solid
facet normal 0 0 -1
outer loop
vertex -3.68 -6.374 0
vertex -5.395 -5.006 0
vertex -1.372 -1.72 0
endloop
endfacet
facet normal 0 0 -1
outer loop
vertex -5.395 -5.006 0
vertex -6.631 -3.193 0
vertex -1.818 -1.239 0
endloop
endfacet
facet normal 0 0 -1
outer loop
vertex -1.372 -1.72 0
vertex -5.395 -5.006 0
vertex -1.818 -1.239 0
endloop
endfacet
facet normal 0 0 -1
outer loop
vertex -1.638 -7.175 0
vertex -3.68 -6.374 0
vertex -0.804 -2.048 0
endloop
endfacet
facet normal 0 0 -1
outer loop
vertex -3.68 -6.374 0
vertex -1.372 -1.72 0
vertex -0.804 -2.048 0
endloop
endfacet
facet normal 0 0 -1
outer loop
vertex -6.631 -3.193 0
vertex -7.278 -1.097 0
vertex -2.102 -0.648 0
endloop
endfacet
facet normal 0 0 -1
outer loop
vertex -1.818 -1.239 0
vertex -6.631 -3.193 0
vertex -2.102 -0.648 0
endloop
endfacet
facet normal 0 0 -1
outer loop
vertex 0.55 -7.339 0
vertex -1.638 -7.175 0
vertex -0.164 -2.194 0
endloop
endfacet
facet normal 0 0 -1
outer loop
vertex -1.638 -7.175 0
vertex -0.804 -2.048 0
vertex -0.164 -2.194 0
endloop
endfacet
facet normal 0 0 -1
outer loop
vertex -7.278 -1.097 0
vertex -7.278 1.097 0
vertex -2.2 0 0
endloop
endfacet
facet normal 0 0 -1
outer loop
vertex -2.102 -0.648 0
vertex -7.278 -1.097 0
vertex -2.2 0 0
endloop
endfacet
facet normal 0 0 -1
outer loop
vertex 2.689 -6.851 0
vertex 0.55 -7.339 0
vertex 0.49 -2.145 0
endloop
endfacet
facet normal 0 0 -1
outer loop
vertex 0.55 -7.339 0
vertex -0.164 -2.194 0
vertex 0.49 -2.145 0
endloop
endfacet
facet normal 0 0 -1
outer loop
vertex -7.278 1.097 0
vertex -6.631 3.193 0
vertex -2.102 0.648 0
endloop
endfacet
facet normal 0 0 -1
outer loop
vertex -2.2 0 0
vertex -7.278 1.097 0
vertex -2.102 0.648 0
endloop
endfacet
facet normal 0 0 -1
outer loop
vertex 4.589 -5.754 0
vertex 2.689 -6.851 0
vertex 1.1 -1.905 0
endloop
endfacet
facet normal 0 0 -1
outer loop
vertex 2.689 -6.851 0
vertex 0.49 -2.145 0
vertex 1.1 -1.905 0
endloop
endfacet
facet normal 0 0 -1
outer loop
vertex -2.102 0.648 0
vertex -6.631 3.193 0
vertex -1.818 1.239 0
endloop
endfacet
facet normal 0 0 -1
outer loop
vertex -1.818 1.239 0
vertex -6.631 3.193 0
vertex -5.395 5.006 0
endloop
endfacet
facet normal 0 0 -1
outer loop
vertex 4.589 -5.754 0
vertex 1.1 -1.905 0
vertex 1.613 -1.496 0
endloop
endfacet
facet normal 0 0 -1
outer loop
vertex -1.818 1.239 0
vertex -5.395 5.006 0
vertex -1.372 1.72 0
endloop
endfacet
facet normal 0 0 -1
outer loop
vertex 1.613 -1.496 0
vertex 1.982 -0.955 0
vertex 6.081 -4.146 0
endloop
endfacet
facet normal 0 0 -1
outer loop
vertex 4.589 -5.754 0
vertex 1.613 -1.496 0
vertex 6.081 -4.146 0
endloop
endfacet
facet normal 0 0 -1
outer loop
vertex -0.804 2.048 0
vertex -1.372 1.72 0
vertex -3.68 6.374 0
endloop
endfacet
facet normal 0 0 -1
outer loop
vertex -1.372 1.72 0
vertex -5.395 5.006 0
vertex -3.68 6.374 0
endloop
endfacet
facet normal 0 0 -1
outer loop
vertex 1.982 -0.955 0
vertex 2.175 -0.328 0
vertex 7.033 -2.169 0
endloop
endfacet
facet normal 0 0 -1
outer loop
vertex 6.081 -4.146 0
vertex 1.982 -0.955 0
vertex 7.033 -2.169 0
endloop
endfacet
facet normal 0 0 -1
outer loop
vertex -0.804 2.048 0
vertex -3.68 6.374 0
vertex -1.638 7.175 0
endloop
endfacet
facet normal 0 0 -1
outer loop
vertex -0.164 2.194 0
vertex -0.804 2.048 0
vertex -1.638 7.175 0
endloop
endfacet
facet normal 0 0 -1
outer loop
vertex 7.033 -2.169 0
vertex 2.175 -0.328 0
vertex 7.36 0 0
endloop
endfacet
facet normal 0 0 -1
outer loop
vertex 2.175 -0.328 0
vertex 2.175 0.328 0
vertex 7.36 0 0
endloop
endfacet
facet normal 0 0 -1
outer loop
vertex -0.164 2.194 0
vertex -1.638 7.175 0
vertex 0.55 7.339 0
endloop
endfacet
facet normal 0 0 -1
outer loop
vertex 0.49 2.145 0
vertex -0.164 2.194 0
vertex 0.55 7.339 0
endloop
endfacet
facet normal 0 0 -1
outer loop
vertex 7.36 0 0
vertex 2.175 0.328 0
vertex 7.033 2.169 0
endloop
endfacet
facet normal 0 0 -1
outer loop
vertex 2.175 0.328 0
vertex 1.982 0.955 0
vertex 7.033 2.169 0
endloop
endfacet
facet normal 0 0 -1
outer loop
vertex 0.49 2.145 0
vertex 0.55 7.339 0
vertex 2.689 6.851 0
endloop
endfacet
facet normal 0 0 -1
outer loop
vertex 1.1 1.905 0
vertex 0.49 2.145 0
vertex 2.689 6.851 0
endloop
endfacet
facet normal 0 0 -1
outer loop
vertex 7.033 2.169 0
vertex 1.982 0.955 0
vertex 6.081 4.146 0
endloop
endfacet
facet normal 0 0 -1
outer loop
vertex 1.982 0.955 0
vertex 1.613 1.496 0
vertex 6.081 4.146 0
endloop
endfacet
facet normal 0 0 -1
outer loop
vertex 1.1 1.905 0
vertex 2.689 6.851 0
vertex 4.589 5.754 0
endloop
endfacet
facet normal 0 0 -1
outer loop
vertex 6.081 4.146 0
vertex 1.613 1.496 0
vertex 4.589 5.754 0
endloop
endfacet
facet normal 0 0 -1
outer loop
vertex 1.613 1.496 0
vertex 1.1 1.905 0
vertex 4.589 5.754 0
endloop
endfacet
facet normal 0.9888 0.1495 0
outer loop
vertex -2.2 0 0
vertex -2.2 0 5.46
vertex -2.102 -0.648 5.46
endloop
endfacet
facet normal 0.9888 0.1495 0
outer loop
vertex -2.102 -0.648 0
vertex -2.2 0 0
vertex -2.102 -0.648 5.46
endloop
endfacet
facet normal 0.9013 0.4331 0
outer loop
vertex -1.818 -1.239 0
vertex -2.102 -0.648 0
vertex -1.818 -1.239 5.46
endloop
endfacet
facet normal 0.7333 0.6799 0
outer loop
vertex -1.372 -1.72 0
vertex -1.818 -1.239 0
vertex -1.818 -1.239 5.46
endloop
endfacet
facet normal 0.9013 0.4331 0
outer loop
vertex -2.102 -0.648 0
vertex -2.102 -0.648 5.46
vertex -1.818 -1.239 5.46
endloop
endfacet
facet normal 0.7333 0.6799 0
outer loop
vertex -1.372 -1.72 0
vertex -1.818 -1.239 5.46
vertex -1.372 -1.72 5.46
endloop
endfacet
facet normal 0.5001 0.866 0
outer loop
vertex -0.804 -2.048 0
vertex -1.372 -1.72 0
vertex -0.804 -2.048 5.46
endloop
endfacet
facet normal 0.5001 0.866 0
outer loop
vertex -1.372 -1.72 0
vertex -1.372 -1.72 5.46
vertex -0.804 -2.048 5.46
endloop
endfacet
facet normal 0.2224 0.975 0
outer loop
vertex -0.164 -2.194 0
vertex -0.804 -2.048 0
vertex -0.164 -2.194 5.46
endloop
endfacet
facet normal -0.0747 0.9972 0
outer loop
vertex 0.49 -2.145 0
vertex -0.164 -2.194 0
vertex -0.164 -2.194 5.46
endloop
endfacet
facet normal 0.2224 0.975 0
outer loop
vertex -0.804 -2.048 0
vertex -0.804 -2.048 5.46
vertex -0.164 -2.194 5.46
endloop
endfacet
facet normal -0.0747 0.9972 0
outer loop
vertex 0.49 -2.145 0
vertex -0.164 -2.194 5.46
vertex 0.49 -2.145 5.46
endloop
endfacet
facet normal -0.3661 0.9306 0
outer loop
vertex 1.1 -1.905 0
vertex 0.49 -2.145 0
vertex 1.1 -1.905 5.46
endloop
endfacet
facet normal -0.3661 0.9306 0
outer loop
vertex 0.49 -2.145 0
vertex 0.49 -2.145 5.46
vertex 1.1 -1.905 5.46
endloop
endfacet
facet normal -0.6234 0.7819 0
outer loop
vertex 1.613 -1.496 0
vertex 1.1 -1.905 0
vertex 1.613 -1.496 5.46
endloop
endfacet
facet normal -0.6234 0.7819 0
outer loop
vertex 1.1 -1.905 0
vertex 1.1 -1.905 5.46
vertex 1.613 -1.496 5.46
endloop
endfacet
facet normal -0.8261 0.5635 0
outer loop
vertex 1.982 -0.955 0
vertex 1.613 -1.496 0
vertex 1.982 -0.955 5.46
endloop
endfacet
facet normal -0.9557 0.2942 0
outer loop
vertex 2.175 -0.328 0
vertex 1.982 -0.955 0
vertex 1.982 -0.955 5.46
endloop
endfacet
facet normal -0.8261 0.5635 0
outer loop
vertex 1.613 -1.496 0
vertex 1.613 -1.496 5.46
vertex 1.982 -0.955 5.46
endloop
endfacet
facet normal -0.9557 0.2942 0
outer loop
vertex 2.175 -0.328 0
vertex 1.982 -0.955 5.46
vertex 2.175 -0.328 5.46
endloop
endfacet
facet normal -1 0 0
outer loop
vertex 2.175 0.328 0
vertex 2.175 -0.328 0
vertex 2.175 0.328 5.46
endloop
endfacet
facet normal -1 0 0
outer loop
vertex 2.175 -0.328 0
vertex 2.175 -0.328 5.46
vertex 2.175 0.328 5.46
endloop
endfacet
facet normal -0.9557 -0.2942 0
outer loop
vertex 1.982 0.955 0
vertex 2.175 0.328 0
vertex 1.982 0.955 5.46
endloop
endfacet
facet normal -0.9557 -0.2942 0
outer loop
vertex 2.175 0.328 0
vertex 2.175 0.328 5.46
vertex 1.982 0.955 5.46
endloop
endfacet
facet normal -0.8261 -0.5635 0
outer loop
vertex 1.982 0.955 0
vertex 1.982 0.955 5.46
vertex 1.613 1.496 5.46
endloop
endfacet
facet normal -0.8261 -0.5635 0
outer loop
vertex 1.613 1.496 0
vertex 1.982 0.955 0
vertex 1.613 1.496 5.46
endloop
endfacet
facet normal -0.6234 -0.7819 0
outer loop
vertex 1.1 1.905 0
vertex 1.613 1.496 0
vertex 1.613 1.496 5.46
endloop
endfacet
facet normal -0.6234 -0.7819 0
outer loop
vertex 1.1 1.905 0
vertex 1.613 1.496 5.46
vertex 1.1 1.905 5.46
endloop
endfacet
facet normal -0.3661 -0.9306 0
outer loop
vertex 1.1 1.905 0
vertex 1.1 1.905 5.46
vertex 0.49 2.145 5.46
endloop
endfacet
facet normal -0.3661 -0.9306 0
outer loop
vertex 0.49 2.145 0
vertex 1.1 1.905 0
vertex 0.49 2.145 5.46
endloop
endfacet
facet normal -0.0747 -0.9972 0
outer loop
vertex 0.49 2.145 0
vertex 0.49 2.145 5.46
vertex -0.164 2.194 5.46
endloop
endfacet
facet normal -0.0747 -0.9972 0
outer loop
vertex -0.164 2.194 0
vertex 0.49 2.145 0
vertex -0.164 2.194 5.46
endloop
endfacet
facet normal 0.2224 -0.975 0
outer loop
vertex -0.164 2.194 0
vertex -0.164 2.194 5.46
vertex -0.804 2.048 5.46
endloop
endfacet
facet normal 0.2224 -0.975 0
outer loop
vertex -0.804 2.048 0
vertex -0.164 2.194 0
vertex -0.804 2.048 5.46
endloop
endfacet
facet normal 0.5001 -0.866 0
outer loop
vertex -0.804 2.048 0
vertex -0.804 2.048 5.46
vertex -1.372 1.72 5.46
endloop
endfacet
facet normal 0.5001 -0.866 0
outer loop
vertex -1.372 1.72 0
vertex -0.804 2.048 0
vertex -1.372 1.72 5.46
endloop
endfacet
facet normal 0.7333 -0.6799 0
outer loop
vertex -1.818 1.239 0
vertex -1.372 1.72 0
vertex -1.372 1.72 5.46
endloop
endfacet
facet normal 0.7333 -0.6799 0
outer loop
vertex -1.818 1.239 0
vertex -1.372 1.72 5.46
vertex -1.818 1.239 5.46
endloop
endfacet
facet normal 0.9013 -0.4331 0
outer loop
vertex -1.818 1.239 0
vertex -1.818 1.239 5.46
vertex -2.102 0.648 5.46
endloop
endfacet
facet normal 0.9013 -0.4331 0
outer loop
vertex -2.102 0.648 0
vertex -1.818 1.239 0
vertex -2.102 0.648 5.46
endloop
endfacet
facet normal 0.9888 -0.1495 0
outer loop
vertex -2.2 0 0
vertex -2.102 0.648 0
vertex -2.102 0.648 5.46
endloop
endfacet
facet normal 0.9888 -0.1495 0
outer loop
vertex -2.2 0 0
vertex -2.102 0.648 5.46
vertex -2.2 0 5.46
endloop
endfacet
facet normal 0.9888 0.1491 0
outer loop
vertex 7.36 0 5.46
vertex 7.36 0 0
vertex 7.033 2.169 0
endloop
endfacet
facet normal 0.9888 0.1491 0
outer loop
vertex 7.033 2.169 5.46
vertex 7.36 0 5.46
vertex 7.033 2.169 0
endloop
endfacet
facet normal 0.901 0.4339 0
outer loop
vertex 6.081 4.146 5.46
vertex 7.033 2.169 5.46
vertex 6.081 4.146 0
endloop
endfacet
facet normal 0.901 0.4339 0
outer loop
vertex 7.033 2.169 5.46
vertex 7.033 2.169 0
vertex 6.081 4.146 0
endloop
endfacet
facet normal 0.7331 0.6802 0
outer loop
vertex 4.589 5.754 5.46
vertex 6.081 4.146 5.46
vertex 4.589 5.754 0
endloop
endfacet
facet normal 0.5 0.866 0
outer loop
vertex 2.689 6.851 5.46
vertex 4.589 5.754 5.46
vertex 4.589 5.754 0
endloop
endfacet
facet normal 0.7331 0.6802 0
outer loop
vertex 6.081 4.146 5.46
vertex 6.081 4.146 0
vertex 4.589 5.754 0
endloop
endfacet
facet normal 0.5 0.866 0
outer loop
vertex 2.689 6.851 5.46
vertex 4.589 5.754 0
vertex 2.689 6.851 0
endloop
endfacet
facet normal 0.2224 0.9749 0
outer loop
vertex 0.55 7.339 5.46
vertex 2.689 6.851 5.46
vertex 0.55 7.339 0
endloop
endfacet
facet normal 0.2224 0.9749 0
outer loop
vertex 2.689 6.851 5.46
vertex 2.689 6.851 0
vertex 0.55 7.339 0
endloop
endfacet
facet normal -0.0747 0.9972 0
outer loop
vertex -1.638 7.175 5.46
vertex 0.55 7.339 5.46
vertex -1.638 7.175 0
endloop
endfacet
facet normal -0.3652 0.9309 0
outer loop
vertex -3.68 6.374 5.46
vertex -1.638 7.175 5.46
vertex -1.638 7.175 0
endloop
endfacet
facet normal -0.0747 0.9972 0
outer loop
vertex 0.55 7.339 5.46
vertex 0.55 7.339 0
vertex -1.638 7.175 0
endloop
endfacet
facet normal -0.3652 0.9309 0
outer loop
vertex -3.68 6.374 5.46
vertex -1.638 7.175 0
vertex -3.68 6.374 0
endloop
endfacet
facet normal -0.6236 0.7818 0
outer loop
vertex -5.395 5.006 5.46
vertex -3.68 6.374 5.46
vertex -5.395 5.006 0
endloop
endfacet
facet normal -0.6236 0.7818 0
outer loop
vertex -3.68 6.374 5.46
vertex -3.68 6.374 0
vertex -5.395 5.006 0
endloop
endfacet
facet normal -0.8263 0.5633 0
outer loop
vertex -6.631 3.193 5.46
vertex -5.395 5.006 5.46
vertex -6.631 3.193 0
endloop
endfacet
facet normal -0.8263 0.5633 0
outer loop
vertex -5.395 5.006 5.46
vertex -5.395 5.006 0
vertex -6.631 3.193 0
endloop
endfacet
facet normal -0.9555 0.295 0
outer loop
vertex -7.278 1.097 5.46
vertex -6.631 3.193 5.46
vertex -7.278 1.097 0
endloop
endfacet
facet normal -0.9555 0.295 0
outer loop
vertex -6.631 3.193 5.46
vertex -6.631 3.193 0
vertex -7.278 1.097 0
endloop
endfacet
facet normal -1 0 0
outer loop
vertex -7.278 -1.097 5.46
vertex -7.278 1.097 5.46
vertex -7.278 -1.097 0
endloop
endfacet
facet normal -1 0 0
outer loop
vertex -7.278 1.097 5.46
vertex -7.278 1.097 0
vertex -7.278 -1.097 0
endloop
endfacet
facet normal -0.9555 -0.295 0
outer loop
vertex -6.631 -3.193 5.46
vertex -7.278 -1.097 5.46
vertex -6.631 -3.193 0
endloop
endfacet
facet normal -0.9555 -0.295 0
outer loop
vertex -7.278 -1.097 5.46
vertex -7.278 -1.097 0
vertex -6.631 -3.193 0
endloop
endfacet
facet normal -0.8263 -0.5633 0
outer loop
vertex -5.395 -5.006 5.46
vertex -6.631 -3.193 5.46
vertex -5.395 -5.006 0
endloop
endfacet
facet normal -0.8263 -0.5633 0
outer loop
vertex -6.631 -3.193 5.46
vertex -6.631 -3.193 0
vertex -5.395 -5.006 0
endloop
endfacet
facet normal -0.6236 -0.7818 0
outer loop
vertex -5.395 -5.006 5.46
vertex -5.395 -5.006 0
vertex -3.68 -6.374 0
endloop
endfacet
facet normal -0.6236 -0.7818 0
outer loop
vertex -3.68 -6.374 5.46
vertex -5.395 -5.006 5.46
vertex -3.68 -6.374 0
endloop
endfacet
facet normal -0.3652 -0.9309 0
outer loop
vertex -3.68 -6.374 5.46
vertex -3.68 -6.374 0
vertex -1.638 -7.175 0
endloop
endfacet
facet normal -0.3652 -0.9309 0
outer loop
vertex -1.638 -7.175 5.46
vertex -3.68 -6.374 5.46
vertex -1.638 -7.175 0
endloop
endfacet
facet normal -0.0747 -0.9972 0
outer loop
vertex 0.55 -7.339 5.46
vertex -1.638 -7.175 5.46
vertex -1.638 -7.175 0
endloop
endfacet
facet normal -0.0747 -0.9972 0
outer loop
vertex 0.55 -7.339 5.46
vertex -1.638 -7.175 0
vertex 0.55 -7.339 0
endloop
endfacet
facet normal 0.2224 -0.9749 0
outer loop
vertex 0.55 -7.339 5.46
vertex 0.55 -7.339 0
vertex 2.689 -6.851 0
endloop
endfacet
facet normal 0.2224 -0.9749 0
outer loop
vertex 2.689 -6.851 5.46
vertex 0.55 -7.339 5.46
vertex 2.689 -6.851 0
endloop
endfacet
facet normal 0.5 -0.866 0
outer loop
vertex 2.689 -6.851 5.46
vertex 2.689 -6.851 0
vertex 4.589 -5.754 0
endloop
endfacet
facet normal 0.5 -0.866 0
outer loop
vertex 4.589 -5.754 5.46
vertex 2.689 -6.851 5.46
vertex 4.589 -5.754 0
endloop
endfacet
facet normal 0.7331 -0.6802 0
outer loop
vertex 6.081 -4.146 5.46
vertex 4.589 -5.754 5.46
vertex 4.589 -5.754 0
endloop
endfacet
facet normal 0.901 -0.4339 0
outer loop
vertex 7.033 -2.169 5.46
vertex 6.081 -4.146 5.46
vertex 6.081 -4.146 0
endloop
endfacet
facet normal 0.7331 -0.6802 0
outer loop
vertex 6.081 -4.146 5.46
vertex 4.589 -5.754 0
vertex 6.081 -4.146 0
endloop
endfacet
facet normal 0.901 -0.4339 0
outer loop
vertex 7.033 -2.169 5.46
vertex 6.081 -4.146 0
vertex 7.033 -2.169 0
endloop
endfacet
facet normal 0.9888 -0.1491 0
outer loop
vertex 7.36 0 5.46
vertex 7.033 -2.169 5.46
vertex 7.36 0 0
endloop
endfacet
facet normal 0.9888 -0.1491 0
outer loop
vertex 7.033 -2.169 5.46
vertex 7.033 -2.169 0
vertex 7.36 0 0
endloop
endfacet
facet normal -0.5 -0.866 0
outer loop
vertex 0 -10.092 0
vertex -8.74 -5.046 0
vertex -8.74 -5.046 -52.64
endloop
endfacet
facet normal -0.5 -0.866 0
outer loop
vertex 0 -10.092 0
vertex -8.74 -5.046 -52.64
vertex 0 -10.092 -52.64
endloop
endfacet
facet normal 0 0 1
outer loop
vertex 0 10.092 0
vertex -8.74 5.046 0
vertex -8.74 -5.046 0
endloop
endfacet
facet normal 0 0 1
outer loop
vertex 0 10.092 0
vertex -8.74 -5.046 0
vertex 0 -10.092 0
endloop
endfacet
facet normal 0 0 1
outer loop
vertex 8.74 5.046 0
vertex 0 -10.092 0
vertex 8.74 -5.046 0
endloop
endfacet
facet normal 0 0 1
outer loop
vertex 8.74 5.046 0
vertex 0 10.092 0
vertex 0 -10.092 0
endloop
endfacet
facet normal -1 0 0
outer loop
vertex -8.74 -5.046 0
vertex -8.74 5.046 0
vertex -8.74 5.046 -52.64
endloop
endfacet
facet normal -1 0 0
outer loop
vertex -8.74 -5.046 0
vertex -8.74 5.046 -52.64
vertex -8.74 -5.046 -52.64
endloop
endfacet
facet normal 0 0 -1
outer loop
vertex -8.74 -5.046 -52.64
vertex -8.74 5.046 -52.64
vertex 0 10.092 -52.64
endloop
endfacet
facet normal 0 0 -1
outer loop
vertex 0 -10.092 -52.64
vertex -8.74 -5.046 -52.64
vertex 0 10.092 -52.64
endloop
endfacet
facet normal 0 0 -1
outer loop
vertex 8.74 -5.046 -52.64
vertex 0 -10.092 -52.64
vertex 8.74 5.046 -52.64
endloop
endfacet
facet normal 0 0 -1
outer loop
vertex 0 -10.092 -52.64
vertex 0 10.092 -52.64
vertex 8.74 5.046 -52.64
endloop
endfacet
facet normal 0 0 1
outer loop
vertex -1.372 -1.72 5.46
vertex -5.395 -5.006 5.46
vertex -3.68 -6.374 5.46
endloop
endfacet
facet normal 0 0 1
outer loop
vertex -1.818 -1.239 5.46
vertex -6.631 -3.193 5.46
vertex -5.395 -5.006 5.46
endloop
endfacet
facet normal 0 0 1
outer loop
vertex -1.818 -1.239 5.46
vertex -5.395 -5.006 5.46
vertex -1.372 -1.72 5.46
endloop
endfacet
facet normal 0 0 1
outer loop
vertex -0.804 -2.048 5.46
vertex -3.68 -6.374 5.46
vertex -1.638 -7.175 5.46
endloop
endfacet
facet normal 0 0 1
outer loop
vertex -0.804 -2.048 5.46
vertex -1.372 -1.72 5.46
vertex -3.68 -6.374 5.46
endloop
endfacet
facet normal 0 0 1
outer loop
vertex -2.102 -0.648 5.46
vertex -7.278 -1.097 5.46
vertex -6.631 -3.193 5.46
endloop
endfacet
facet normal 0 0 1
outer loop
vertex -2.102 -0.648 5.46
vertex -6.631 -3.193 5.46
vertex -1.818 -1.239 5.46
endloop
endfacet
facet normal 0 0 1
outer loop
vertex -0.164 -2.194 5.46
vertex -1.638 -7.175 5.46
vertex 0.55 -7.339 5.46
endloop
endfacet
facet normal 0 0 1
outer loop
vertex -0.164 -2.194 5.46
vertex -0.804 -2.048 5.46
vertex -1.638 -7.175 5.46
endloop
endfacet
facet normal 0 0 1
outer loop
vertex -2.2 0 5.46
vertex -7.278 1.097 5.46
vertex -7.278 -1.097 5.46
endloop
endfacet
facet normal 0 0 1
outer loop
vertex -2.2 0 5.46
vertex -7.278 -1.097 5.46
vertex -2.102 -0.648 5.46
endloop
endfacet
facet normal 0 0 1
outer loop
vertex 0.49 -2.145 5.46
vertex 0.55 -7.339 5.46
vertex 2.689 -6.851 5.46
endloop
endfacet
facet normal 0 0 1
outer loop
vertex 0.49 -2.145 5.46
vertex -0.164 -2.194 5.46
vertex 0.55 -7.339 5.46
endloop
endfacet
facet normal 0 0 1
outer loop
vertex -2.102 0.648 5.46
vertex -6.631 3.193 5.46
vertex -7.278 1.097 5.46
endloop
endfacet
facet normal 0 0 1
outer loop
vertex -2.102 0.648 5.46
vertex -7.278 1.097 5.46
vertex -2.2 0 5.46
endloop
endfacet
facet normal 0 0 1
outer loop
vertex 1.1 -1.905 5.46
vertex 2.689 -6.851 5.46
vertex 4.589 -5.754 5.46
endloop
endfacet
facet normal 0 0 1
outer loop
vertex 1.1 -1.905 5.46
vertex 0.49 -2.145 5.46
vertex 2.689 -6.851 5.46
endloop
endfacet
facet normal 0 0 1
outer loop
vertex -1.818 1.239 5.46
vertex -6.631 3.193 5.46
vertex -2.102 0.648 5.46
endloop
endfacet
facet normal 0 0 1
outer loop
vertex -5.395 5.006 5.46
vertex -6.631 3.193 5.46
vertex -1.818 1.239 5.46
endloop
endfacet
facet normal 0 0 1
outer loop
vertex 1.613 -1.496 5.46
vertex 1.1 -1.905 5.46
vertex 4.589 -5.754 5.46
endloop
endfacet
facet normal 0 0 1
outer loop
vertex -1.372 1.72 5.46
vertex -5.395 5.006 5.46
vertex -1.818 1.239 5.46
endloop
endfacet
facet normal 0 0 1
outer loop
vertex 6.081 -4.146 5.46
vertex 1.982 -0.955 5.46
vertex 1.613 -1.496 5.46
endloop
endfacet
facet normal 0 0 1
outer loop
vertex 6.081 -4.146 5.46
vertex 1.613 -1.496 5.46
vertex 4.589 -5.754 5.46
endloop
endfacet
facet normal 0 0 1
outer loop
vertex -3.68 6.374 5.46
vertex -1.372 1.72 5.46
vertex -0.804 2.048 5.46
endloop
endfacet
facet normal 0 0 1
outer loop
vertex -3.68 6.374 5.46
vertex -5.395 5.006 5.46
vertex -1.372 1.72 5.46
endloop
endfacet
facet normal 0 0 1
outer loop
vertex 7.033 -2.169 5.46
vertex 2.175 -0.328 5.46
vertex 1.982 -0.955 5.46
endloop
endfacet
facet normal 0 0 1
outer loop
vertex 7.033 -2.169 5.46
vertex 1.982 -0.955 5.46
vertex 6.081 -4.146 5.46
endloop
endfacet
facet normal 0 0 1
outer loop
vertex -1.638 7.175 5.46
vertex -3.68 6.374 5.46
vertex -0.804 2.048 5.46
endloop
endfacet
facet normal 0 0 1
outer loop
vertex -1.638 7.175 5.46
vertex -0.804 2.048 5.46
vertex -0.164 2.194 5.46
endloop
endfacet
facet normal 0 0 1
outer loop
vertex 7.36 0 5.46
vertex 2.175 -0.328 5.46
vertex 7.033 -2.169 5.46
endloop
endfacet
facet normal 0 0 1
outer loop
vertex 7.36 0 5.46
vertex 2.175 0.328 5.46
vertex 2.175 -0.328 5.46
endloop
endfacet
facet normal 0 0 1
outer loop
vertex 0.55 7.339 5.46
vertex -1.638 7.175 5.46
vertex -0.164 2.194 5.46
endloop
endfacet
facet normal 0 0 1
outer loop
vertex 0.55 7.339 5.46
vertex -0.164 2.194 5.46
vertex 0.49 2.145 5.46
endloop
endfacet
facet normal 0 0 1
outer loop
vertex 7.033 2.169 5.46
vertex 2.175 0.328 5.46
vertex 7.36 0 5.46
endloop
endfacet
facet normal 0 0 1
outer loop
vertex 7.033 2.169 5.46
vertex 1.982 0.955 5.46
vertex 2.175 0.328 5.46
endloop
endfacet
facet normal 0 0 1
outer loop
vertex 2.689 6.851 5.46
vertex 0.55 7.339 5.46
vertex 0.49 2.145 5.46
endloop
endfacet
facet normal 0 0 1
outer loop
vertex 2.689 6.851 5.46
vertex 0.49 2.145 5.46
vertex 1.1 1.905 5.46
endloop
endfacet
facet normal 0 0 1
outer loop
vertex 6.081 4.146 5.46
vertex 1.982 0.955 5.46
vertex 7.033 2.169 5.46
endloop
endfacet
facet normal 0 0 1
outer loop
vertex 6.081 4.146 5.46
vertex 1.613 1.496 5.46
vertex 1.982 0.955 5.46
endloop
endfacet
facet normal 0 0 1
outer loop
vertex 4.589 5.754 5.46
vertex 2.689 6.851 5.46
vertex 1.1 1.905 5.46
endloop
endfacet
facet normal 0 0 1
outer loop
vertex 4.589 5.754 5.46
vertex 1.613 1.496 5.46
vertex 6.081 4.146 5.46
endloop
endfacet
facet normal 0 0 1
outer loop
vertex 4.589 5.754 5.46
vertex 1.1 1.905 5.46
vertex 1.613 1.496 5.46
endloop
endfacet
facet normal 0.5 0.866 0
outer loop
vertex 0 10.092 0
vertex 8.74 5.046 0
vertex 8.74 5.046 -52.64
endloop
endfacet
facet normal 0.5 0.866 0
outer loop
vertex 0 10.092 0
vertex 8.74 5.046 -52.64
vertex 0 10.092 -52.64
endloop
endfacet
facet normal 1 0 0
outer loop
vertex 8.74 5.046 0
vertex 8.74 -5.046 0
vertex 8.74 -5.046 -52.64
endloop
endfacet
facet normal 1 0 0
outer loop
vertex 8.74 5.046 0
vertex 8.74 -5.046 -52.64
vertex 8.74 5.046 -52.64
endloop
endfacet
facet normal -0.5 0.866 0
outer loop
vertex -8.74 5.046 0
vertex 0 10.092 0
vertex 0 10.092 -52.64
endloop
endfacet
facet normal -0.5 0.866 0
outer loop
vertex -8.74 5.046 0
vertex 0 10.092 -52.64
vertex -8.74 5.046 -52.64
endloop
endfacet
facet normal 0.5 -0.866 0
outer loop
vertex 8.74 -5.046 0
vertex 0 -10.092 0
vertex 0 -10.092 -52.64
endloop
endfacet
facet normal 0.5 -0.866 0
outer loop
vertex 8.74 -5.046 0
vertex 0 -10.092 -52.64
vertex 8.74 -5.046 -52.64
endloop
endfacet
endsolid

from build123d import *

# Parameters (mm, degrees)
F1_DEPTH = 52.64
F2_R     = 7.36
F3_DEPTH = 5.46
F5_D     = 4.4


with BuildPart() as f1:
    # F0 (on Top) → F1 (new body)
    with BuildSketch(Plane.XY):
        Polygon((8.74, -5.0460413527), (8.74, 5.0460413527), (0, 10.0920827054), (-8.74, 5.0460413527), (-8.74, -5.0460413527), (0, -10.0920827054), align=None)
    extrude(amount=-F1_DEPTH)


with BuildPart() as f3:
    # F2 (on Top) → F3 (new body)
    with BuildSketch(Plane.XY):
        Circle(F2_R)
    extrude(amount=F3_DEPTH)

    # F5 (through all)
    with Locations(Plane(origin=(0, 0, 0), x_dir=(1, 0, 0), z_dir=(0, 0, -1))):
        with Locations((0, 0)):
            Hole(F5_D / 2)


solid = Compound([f1.part, f3.part])
